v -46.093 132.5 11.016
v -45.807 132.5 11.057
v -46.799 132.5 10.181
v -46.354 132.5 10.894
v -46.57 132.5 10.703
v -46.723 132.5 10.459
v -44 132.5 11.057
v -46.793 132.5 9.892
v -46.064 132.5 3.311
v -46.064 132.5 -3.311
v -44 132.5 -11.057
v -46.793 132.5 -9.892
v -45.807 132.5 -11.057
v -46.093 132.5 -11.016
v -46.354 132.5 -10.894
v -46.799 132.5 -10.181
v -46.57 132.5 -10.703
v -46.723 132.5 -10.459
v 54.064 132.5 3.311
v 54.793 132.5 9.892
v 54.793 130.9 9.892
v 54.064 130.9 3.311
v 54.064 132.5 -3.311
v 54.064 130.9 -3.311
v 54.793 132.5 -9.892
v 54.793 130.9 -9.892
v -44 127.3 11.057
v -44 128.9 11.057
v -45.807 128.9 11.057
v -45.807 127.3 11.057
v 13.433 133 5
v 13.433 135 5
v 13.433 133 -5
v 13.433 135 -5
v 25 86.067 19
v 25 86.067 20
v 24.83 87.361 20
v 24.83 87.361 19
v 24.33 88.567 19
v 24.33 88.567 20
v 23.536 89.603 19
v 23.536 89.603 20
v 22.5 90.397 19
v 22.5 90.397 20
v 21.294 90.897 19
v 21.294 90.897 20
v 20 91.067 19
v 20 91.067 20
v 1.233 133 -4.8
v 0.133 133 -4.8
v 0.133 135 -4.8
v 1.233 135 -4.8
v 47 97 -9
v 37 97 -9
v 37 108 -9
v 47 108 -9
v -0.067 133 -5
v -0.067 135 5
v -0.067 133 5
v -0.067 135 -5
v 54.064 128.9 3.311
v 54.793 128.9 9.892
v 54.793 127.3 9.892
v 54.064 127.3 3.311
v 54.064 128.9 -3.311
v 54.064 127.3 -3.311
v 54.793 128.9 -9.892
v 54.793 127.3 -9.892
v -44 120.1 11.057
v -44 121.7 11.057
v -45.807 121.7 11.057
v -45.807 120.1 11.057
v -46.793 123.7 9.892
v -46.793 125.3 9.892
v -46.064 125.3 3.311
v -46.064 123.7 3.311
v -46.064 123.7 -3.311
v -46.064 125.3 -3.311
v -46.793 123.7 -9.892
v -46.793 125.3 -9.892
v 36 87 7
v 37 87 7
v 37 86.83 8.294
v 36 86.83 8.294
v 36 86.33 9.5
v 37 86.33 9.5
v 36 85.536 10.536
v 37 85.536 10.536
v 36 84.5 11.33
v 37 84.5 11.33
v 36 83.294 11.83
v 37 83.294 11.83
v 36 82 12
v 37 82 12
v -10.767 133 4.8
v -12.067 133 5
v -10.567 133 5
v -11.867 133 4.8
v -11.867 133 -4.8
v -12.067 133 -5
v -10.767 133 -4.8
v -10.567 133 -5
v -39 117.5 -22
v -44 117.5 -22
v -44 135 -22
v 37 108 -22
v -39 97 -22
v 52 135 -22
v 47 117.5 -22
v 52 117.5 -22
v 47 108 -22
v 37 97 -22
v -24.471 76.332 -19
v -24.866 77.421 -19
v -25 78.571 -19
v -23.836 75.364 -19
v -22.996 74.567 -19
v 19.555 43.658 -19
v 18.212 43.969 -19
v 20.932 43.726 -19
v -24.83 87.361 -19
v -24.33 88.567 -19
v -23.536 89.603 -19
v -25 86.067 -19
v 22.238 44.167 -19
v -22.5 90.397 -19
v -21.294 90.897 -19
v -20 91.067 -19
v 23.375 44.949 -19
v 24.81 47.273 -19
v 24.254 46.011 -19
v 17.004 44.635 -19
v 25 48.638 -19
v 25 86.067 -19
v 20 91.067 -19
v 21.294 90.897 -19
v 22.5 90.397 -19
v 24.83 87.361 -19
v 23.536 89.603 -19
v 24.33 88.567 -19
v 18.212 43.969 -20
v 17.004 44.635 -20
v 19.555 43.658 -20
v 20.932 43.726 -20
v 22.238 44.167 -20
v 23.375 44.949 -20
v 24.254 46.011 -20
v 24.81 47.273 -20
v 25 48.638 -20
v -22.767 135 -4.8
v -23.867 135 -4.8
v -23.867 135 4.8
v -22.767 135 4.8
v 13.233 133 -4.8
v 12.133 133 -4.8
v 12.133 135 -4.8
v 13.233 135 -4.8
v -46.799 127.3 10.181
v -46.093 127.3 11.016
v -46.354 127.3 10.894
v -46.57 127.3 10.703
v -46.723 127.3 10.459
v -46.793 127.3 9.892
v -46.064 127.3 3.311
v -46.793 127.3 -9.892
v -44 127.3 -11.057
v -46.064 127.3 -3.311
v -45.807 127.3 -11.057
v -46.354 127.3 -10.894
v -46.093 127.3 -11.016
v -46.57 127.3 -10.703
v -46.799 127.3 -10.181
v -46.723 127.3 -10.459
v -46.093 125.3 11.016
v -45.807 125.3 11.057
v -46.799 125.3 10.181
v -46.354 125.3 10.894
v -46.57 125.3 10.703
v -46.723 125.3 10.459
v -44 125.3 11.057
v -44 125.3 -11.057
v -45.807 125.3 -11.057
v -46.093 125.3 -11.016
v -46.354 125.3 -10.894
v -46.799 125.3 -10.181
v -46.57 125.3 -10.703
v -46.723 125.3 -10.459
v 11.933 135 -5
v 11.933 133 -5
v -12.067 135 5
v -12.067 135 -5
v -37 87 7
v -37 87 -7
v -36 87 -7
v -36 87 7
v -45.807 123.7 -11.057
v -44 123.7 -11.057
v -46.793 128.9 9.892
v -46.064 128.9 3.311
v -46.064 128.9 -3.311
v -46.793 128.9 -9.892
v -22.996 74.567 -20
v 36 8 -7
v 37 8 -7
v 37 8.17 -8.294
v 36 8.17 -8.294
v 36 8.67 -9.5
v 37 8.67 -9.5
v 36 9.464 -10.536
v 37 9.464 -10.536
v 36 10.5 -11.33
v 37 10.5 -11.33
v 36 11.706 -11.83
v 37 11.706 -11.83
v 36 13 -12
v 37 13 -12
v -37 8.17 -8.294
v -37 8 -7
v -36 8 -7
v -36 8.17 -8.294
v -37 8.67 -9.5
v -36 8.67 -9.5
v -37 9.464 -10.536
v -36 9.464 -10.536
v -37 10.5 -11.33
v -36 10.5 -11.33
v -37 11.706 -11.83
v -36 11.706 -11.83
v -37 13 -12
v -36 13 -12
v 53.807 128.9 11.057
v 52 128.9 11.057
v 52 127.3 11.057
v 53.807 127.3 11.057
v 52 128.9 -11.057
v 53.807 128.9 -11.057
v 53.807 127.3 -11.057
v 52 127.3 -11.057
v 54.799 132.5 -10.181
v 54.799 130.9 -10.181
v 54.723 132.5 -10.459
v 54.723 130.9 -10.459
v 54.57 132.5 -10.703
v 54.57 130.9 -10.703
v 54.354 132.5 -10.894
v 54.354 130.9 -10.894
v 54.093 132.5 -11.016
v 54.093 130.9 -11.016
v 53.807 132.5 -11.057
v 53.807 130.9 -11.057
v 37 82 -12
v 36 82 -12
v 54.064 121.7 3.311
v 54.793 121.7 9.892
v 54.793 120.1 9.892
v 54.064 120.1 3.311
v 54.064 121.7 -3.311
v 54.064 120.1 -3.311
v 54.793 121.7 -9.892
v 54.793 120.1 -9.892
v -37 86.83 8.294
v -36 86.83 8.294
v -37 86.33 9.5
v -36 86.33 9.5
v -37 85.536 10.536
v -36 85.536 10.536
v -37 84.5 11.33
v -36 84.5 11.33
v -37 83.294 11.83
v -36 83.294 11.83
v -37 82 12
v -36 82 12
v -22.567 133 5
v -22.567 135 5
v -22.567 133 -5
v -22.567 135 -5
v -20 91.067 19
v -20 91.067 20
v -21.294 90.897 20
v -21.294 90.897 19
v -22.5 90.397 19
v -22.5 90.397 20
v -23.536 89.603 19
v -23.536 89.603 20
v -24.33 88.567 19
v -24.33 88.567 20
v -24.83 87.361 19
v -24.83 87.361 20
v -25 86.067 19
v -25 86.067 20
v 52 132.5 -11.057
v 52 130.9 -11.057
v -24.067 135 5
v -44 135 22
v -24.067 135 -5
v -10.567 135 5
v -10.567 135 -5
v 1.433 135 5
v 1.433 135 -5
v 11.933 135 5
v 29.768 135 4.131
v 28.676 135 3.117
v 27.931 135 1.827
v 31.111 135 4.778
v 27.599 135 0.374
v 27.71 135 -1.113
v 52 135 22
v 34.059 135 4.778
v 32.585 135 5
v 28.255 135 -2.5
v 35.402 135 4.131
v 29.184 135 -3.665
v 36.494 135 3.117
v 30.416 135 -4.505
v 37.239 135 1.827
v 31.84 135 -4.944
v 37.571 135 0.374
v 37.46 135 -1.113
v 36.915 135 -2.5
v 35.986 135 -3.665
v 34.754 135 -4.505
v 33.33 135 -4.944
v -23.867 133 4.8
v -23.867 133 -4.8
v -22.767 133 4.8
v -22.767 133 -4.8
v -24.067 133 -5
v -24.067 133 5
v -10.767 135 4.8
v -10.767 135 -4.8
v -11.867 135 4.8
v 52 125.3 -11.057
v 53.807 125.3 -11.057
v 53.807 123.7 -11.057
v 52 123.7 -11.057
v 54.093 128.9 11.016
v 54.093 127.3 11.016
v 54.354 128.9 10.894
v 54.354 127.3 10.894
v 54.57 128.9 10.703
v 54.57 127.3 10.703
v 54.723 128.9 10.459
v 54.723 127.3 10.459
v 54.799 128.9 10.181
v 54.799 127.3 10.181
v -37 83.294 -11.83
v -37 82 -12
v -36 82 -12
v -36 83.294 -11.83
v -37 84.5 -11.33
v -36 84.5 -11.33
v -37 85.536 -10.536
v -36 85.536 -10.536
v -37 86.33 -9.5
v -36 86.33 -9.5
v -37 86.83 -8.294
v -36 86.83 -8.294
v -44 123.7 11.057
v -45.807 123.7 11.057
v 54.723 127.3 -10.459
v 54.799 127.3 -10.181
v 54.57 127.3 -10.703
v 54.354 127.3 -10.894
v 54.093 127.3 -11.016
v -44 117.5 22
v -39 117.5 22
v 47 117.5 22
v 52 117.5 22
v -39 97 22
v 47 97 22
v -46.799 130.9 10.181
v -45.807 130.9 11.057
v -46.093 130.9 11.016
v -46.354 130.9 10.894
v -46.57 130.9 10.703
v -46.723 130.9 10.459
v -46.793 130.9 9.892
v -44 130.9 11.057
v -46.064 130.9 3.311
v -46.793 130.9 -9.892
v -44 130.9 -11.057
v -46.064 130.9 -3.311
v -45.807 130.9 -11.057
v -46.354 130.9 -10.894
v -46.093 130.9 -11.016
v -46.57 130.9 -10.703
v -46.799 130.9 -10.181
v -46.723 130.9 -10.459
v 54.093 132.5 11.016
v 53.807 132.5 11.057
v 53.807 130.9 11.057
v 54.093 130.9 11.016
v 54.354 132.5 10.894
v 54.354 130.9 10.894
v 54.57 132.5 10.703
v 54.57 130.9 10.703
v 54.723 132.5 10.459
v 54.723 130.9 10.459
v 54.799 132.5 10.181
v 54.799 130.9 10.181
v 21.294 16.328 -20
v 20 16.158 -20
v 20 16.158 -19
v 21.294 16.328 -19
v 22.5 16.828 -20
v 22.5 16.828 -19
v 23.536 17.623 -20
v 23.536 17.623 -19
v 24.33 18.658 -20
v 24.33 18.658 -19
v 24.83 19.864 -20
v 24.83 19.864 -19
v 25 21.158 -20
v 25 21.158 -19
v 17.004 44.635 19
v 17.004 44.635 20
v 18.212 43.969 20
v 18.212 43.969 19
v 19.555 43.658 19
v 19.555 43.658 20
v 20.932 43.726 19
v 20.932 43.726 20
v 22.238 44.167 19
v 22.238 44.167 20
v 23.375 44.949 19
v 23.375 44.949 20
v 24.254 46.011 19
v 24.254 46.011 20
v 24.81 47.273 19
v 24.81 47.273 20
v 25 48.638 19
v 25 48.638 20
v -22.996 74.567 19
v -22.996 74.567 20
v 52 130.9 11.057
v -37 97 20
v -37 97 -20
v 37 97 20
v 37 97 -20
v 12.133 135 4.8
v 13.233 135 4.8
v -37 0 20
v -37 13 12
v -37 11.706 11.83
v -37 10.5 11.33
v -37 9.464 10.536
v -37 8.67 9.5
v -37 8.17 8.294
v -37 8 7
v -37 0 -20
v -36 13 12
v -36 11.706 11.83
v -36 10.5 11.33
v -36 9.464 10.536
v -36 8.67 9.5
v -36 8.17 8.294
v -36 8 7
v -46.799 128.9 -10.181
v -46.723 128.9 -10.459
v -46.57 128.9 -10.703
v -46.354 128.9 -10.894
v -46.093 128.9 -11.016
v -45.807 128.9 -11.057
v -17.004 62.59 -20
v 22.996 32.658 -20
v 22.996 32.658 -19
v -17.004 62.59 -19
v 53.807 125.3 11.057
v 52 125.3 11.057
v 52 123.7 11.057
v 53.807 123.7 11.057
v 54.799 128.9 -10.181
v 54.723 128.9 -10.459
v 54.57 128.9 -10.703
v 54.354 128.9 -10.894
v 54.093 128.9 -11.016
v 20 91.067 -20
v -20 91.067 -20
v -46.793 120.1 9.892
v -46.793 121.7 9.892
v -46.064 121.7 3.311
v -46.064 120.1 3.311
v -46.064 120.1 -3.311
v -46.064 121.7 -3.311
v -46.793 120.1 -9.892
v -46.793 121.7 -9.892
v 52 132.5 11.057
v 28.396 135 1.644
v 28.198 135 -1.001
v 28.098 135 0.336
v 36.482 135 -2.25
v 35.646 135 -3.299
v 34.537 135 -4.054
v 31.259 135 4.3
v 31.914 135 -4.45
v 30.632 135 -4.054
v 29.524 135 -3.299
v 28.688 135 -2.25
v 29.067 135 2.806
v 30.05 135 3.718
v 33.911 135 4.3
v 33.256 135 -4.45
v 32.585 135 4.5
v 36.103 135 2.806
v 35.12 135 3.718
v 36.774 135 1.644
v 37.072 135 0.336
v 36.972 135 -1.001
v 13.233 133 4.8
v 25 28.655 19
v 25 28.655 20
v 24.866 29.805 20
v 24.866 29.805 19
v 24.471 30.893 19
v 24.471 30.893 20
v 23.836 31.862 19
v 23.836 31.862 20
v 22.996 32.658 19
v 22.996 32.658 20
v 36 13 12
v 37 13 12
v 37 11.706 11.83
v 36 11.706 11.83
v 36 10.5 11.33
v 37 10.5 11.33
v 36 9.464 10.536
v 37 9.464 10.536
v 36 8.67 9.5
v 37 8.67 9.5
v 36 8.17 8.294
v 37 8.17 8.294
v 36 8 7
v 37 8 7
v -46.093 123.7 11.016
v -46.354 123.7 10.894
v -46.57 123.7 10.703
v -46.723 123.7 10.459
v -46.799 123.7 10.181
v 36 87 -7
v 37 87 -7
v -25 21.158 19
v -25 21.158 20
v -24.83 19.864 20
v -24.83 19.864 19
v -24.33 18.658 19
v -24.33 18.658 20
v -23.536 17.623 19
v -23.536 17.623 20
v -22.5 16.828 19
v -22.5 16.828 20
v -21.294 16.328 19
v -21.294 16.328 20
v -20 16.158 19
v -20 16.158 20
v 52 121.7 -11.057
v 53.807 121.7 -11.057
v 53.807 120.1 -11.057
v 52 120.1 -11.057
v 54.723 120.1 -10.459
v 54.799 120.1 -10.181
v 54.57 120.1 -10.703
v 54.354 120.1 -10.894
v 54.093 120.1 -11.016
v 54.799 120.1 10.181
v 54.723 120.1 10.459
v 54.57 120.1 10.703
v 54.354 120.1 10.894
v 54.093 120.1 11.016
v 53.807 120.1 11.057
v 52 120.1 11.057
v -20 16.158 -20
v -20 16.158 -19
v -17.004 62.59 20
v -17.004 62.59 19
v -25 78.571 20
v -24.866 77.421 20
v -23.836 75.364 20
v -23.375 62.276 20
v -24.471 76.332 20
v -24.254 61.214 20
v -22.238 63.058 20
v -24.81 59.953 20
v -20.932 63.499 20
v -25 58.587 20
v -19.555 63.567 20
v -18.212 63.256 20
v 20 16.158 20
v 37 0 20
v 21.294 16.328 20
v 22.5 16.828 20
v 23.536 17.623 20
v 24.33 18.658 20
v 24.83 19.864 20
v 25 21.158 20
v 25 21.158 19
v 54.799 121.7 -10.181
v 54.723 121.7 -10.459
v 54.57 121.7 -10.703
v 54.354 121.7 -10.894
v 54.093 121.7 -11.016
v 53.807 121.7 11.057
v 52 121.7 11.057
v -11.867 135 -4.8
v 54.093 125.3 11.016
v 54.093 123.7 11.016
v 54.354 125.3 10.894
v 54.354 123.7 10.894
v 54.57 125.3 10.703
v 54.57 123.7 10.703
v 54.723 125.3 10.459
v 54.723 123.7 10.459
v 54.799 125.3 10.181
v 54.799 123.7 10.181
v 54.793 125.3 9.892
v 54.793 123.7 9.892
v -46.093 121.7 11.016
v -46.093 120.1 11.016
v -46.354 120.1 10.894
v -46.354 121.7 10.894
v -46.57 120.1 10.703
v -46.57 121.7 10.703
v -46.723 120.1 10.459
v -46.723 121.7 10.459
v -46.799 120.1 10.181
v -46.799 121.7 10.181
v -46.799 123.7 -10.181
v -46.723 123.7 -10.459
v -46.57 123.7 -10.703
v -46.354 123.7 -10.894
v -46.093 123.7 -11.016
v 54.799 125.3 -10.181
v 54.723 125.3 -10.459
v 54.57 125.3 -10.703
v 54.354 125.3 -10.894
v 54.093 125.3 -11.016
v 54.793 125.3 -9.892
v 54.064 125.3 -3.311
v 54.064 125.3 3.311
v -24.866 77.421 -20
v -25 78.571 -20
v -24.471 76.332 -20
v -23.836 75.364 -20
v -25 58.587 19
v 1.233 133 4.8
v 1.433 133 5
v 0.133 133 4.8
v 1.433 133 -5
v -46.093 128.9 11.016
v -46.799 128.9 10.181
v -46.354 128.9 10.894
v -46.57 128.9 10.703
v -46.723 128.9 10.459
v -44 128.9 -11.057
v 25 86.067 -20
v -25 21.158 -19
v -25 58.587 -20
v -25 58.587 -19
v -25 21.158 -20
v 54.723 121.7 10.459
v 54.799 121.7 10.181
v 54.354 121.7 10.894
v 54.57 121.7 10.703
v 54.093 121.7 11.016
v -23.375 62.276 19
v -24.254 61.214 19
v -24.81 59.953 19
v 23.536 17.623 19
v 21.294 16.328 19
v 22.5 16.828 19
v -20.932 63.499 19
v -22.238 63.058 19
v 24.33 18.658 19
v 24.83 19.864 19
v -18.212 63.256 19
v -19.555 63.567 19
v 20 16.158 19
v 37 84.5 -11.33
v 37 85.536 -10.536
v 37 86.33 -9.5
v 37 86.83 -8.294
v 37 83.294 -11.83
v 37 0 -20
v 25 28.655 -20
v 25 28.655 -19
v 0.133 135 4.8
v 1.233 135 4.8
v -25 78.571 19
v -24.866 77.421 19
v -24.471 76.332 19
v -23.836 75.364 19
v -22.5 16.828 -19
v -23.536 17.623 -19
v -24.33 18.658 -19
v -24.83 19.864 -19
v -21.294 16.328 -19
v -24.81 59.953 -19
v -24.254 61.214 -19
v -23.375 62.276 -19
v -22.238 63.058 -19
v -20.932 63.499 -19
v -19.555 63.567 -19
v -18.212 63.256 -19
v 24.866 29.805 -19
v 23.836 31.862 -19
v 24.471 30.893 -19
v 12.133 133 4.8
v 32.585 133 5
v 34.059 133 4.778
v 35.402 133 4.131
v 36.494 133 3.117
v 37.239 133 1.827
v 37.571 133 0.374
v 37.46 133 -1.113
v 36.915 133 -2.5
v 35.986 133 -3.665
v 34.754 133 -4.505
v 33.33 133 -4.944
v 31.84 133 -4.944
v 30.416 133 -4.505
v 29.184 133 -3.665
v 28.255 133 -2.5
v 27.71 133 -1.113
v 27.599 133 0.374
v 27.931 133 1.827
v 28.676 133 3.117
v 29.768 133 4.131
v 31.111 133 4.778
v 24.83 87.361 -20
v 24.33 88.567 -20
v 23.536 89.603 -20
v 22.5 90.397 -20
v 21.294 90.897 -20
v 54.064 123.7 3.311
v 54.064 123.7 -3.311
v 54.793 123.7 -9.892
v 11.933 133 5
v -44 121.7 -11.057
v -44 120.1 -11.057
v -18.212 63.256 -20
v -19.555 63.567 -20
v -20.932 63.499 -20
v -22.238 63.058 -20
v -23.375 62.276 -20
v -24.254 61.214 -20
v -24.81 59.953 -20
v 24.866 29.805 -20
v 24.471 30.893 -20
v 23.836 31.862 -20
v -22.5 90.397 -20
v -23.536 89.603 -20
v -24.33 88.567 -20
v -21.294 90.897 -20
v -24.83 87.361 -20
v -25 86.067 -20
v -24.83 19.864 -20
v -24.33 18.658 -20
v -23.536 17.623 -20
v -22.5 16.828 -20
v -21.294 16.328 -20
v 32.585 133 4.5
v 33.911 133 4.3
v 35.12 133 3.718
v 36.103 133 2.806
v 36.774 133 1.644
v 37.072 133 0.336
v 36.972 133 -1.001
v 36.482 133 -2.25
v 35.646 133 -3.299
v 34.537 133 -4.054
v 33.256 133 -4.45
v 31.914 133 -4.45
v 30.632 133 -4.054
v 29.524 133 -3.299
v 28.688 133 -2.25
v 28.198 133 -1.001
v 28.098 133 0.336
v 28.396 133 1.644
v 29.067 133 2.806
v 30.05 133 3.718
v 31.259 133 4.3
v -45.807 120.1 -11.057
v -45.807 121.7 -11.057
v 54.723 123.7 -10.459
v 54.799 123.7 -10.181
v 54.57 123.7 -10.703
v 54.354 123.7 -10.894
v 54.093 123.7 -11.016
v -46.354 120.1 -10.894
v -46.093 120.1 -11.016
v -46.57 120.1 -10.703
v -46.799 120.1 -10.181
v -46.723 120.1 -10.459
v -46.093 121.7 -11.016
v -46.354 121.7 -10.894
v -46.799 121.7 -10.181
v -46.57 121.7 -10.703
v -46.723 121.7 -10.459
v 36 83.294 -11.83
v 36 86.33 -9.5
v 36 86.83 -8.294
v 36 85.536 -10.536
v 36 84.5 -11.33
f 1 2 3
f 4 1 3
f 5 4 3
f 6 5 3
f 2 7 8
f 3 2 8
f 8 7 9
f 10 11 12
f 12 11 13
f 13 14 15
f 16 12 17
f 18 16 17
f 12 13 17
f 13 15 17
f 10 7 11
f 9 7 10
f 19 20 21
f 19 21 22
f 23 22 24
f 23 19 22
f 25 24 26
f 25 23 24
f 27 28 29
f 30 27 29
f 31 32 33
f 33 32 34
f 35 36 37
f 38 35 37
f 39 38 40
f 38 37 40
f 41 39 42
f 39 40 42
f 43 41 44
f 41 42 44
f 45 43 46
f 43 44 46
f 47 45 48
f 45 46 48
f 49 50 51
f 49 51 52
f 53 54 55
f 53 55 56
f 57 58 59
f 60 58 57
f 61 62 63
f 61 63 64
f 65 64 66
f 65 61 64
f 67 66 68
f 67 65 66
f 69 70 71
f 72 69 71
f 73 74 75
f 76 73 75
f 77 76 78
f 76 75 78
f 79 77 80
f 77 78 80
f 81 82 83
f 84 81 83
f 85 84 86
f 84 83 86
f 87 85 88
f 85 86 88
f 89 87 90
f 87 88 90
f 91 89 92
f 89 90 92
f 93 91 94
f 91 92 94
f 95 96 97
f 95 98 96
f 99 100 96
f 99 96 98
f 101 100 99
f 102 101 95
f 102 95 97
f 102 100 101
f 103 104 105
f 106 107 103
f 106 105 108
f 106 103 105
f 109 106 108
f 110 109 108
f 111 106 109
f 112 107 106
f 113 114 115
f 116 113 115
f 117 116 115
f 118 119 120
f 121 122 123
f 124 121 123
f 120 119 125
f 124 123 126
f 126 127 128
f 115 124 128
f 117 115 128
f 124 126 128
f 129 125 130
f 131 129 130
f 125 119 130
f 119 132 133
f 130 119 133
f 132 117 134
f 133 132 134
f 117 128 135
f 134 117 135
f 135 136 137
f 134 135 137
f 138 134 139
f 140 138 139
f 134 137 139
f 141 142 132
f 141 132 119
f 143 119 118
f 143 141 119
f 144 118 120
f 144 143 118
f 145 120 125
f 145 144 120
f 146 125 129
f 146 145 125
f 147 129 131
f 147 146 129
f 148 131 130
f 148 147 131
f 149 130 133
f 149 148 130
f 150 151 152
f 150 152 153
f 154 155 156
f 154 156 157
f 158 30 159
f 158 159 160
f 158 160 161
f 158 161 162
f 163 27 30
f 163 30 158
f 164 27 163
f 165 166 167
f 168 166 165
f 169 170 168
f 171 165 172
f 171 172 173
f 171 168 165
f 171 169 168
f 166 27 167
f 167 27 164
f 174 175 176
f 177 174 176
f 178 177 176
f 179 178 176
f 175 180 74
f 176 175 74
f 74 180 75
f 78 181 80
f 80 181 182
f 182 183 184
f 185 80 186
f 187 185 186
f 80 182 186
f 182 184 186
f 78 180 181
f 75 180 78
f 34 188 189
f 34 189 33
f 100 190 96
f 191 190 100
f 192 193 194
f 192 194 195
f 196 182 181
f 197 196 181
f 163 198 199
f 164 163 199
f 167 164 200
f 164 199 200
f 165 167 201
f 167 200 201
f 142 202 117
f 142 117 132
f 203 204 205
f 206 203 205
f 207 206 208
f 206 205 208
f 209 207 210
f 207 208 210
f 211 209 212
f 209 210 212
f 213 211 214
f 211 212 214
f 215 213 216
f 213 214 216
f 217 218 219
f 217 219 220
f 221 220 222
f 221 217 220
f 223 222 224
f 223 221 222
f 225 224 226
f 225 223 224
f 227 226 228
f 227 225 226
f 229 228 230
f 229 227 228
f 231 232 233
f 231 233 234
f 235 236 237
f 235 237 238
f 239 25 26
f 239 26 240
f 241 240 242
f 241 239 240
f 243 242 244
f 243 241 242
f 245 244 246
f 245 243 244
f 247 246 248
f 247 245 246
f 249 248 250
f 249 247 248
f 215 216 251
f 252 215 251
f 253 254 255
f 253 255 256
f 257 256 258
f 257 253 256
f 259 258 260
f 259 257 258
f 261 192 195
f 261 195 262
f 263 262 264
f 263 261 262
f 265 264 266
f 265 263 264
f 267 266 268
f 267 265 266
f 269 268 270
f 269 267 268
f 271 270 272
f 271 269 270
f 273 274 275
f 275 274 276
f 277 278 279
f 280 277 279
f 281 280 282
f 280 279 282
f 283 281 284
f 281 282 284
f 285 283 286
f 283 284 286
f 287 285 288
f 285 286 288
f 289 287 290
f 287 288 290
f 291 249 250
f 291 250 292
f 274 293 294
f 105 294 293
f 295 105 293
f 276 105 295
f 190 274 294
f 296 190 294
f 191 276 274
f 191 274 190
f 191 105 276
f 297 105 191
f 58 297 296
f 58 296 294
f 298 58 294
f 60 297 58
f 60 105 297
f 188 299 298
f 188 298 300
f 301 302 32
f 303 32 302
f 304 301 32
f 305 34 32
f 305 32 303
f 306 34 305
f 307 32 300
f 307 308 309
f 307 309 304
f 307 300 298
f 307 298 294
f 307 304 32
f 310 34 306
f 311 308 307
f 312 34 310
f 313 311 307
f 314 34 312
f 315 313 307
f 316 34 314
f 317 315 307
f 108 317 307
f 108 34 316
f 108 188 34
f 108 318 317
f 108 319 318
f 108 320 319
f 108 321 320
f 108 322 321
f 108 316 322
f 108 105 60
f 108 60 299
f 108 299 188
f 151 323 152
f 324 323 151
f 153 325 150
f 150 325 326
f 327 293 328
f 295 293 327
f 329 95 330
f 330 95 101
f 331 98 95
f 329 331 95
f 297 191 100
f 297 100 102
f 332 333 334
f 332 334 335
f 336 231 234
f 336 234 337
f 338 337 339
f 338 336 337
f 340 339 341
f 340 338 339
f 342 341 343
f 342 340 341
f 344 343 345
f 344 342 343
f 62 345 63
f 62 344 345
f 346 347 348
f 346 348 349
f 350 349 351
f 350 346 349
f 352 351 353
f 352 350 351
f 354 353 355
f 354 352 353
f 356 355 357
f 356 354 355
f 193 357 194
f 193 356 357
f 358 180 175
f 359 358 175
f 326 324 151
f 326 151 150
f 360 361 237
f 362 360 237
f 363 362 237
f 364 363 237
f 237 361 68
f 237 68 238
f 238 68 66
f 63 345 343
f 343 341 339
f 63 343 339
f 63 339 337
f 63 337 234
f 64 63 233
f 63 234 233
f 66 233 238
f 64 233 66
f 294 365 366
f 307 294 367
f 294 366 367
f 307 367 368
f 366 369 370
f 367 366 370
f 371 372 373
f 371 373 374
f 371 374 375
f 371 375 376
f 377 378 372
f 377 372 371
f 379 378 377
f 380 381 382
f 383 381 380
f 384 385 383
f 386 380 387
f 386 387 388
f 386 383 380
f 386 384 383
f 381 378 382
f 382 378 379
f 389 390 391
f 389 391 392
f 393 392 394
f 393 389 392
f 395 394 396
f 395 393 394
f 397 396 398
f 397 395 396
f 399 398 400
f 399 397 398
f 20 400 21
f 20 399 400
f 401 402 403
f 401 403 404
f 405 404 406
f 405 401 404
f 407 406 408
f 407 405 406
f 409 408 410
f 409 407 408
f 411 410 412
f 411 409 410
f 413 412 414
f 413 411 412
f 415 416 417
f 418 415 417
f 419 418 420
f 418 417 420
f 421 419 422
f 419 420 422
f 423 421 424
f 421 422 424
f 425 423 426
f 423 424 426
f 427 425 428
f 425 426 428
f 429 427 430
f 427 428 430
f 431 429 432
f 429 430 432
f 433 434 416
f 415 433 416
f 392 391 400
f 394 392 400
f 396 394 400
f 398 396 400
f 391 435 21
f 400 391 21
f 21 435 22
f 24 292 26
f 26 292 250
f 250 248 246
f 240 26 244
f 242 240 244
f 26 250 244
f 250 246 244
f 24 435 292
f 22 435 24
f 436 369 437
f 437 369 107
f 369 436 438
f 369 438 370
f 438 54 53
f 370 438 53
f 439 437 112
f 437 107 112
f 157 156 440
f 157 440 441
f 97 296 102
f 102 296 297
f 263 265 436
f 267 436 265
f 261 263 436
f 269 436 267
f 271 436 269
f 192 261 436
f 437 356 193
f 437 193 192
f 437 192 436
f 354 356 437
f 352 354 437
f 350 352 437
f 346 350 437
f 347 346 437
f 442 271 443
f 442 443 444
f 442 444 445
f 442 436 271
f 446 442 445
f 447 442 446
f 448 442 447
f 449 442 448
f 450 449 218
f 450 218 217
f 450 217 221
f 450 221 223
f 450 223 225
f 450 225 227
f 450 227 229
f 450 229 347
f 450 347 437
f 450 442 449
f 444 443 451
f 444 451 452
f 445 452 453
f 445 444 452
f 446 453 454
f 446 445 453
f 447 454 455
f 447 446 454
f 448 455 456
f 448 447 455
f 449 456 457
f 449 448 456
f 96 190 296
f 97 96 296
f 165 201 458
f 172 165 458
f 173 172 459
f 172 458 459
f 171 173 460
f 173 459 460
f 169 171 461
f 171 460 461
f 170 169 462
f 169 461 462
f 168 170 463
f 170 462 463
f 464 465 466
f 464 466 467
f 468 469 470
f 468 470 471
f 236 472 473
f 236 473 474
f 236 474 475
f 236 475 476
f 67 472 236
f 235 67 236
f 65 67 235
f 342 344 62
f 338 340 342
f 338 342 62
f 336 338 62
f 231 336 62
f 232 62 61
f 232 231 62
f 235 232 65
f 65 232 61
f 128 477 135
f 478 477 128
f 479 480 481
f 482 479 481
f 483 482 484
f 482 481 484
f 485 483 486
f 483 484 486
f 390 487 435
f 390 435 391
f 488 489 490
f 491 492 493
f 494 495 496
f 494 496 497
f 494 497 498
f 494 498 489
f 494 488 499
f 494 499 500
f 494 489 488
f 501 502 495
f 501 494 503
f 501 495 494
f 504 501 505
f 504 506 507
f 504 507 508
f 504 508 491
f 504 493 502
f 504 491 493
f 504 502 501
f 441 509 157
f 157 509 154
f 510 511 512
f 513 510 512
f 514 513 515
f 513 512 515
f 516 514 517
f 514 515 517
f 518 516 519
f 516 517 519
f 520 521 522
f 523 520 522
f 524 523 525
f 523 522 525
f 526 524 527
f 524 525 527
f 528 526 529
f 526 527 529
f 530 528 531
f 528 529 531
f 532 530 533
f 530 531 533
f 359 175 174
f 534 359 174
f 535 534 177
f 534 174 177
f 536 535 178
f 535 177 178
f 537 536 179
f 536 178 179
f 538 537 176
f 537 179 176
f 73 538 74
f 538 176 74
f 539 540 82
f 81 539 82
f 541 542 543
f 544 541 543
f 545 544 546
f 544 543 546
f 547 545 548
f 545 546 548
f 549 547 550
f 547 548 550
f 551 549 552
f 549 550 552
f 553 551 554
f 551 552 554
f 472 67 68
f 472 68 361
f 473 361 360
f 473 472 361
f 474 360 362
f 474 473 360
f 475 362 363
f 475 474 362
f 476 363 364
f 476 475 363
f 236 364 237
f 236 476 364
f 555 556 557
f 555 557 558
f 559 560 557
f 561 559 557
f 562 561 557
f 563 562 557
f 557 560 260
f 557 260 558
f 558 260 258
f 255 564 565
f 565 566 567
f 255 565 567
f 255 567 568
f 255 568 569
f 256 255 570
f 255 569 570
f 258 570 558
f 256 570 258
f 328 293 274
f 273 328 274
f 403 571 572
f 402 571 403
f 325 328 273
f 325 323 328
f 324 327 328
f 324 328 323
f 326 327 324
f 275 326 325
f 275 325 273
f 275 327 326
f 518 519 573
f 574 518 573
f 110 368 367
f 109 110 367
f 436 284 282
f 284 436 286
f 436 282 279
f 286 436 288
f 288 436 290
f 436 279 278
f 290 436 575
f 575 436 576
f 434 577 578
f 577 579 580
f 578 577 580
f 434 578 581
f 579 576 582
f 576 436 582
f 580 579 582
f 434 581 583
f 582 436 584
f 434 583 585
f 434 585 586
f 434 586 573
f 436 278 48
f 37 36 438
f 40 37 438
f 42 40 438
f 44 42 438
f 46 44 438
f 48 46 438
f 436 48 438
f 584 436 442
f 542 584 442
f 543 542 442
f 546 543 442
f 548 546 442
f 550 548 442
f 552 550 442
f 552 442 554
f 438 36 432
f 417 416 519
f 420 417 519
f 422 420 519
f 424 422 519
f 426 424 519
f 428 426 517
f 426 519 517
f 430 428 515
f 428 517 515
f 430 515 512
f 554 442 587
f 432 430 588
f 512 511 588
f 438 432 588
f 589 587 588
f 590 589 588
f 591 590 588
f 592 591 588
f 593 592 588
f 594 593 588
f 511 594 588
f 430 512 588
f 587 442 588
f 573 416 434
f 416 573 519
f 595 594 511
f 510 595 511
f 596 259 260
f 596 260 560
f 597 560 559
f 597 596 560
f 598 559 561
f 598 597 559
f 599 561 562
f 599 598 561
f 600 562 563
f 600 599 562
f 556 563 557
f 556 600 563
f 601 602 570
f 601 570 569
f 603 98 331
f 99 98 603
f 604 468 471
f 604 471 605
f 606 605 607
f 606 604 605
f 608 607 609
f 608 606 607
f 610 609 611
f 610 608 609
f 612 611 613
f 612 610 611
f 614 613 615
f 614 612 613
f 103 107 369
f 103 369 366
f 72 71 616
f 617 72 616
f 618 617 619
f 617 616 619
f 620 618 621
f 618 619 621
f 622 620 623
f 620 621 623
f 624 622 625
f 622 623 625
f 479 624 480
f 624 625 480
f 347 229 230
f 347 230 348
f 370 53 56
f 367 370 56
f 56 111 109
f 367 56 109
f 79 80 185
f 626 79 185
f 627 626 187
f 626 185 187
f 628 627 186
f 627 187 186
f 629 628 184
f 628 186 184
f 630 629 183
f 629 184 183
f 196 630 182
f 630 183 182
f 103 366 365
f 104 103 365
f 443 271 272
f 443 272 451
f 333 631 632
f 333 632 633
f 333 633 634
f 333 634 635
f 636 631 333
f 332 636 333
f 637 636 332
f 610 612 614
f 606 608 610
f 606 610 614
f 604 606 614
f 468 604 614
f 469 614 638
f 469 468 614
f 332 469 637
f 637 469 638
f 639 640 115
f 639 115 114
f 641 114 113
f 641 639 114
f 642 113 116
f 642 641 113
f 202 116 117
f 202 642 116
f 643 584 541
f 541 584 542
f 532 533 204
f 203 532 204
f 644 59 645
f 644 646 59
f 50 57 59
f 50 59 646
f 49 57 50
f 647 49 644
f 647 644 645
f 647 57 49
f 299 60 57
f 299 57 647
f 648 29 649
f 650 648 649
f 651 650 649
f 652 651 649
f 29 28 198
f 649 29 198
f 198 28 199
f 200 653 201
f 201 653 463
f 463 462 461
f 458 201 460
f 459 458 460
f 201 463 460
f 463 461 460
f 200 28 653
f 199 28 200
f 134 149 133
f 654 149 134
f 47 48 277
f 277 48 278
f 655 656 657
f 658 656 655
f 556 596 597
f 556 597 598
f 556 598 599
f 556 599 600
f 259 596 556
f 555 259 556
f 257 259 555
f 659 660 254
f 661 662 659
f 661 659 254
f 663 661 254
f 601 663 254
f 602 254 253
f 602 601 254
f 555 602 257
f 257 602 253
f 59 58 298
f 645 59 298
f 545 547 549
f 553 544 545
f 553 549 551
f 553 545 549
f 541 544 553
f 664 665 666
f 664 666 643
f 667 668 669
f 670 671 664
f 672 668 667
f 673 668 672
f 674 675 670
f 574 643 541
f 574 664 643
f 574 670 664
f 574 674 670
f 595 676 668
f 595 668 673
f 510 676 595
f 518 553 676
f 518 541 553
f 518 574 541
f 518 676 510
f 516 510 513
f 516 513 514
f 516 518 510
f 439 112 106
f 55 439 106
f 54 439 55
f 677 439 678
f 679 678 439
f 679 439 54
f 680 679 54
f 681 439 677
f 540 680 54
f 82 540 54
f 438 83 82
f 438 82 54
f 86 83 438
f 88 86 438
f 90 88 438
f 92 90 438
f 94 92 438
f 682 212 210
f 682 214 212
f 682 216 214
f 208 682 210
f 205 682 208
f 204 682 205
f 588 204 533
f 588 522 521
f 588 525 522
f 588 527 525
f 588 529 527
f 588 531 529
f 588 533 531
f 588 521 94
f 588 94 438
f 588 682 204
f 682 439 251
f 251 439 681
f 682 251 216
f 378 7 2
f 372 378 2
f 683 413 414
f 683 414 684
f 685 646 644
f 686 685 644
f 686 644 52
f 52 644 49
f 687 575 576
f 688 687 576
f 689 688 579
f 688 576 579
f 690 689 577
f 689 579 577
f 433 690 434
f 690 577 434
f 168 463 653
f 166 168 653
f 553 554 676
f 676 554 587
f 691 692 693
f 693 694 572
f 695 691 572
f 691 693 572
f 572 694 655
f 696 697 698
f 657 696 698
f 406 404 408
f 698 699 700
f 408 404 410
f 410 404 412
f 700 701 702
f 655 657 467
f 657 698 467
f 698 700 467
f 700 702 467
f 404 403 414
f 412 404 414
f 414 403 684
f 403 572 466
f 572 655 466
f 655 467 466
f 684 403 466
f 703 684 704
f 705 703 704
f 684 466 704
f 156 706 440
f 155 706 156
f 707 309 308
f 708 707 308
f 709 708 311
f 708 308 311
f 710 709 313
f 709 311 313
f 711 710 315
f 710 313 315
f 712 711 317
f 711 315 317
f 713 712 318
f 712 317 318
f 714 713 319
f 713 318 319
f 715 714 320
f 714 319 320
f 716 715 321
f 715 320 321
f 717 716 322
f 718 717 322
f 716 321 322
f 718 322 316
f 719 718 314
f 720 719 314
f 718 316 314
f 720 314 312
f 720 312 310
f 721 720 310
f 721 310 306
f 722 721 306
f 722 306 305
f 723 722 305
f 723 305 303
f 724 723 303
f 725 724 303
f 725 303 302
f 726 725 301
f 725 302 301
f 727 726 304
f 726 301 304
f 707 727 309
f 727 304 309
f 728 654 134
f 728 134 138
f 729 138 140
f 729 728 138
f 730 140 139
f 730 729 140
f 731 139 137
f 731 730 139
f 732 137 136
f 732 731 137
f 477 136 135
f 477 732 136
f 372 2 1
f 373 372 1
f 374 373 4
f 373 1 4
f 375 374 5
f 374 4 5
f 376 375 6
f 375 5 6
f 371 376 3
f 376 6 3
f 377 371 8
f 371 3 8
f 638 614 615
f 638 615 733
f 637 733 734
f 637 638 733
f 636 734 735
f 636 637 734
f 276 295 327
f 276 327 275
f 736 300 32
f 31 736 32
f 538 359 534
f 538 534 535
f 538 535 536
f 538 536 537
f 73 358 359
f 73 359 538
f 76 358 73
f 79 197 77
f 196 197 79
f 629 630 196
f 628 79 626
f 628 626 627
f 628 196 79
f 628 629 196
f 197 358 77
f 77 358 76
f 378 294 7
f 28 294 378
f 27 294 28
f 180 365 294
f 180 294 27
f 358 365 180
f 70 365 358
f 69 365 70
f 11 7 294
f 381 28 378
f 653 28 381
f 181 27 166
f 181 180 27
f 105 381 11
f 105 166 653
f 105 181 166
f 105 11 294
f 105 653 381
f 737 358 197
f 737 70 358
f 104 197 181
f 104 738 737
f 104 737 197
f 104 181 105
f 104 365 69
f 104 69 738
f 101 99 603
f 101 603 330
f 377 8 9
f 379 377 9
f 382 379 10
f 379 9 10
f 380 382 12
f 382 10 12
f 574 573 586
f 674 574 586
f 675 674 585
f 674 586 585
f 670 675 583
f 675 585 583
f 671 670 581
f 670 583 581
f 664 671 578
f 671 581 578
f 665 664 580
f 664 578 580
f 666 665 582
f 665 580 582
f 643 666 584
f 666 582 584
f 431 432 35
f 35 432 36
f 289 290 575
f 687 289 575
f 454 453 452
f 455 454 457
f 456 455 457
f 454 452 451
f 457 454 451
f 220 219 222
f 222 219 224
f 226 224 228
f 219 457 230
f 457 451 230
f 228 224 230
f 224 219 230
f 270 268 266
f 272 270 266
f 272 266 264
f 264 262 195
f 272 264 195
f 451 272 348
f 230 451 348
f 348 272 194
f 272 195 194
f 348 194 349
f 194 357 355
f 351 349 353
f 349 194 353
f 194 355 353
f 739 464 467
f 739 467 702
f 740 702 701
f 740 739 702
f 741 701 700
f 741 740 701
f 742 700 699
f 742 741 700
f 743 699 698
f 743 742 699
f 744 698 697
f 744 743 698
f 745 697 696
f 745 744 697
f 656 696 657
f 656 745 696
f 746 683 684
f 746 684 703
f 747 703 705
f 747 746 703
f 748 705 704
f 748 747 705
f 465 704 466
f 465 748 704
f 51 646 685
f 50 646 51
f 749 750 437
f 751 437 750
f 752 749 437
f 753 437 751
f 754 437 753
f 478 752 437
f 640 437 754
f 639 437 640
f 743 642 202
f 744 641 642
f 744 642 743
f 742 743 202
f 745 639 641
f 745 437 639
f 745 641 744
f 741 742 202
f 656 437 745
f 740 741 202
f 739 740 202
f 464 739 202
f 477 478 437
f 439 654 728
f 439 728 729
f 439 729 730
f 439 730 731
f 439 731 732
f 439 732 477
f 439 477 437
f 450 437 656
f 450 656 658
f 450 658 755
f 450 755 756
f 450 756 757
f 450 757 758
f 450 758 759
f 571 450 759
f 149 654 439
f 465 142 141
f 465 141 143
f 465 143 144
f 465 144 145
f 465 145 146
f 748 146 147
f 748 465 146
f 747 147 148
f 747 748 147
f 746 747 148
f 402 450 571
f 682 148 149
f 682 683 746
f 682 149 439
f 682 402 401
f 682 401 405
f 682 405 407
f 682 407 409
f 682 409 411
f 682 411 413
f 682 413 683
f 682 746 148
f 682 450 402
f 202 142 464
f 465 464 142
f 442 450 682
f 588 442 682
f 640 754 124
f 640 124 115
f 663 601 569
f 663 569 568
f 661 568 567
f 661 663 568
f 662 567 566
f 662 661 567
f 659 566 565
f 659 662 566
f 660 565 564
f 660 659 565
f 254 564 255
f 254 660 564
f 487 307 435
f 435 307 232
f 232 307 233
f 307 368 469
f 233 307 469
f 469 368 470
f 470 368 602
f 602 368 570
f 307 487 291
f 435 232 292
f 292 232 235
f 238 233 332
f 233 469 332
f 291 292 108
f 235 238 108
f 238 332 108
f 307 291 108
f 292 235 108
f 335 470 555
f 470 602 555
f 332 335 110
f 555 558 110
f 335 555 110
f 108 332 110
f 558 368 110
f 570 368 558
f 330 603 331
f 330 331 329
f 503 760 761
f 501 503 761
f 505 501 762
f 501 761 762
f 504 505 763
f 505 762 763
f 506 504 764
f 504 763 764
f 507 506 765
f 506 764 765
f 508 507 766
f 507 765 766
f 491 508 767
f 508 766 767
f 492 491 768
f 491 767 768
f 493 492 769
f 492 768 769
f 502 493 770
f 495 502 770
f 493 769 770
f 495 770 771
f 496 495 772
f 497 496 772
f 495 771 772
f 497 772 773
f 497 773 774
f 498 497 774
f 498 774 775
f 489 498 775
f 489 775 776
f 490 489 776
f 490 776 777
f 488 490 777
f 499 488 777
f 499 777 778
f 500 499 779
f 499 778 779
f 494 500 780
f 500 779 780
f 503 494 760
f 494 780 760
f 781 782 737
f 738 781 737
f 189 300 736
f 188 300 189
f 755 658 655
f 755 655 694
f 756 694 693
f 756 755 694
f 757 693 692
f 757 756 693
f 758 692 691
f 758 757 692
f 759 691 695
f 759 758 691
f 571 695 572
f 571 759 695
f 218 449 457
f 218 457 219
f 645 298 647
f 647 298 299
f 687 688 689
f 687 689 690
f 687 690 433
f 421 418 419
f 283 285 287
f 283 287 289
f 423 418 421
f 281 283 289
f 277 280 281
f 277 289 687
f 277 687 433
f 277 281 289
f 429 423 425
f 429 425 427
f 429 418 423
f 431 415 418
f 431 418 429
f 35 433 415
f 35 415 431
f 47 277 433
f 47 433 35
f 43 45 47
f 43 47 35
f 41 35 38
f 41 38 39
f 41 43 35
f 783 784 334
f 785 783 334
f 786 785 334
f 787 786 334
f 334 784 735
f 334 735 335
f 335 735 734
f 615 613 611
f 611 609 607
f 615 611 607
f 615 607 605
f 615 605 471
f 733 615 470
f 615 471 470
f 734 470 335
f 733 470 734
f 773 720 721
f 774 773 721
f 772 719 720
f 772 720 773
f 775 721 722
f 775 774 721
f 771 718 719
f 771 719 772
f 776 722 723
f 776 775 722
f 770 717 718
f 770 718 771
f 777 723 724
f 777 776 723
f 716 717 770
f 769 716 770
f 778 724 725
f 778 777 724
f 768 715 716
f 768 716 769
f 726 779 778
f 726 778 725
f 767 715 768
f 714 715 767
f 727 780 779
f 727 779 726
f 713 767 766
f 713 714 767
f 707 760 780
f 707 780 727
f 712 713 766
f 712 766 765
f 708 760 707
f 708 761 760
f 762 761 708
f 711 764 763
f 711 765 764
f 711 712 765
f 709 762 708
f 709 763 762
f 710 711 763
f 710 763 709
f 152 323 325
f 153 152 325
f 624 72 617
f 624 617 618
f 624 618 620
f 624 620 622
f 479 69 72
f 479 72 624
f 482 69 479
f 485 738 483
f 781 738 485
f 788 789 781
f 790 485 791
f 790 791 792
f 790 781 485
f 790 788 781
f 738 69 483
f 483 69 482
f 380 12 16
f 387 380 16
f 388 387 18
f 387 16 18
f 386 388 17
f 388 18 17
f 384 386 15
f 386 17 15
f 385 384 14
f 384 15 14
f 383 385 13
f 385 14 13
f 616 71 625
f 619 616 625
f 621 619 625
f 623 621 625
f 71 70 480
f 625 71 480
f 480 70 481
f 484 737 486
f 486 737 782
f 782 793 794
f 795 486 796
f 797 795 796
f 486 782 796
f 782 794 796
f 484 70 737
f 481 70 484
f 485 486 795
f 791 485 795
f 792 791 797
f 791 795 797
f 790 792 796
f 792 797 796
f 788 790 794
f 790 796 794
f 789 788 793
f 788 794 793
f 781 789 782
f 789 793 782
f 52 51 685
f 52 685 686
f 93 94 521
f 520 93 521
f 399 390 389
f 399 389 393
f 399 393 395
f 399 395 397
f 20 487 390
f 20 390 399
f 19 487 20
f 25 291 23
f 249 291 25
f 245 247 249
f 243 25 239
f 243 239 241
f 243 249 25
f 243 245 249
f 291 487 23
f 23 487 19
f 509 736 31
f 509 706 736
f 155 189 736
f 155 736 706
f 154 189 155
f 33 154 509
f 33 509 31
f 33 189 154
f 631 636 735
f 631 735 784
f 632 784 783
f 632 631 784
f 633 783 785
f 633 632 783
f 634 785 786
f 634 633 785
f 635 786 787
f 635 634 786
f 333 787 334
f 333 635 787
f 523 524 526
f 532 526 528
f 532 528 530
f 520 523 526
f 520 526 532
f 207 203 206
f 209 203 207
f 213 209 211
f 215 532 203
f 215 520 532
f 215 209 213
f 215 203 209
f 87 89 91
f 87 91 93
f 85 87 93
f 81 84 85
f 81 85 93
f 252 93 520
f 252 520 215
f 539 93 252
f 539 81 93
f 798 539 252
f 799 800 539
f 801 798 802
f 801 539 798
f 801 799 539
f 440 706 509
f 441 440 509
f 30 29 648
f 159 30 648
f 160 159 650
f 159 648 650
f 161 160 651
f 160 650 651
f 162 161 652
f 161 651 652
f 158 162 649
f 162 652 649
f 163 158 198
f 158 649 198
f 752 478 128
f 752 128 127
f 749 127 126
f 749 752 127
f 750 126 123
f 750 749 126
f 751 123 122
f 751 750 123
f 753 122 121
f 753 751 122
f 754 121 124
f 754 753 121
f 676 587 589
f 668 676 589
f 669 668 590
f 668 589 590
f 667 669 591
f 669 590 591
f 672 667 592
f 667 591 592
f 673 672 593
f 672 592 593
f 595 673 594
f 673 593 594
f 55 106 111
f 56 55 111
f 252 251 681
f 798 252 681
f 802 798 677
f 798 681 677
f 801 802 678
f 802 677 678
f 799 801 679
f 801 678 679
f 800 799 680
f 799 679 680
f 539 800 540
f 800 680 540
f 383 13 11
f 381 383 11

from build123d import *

# Parameters (mm, degrees)
SKETCH_1_W             = 74
SKETCH_1_H             = 40
EXTRUDE_1_DEPTH        = 97
SKETCH_2_W             = 96
SKETCH_2_H             = 44
EXTRUDE_2_DEPTH        = 38
SKETCH_3_W             = 10
SKETCH_3_H             = 13
CUT_EXTRUDE_1_DEPTH    = 11
SKETCH_4_W             = 5
SKETCH_4_H             = 44
CUT_EXTRUDE_2_DEPTH    = 11
SKETCH_5_R             = 5
SKETCH_5_W             = 1.5
SKETCH_5_H             = 10
CUT_EXTRUDE_3_DEPTH    = 2
SKETCH_6_R             = 4.5
SKETCH_6_W             = 1.1
SKETCH_6_H             = 9.6
EXTRUDE_3_DEPTH        = 2
EXTRUDE_4_DEPTH        = 1.6
PATTERN_LINEAR_1_COUNT = 4
PATTERN_LINEAR_1_PITCH = 3.6
MIRROR_2_COPY_1_DEPTH  = 1.6
MIRROR_2_COPY_2_DEPTH  = 1.6
MIRROR_2_COPY_3_DEPTH  = 1.6
CUT_EXTRUDE_4_DEPTH    = 1
CUT_EXTRUDE_5_DEPTH    = 1
SKETCH_10_W            = 5
SKETCH_10_H            = 20.5
SKETCH_10_H_2          = 9.5
CUT_EXTRUDE_6_DEPTH    = 153.199942279


with BuildPart() as part:
    # 草图1 → 凸台-拉伸1 (new body)
    with BuildSketch(Plane(origin=(0, 0, 0), x_dir=(1, 0, 0), z_dir=(0, 1, 0))):
        Rectangle(SKETCH_1_W, SKETCH_1_H)
    extrude(amount=EXTRUDE_1_DEPTH)

    # 草图2 → 凸台-拉伸2 (add)
    with BuildSketch(Plane(origin=(0, 97, 0), x_dir=(1, 0, 0), z_dir=(0, 1, 0))):
        with Locations((4, 0)):
            Rectangle(SKETCH_2_W, SKETCH_2_H)
    extrude(amount=EXTRUDE_2_DEPTH)

    # 草图3 → 切除-拉伸1 (cut)
    with BuildSketch(Plane.XZ.offset(-97)):
        with Locations((42, -15.5)):
            Rectangle(SKETCH_3_W, SKETCH_3_H)
    extrude(amount=-CUT_EXTRUDE_1_DEPTH, mode=Mode.SUBTRACT)

    # 草图4 → 切除-拉伸2 (cut)
    with BuildSketch(Plane.XZ.offset(-97)):
        with Locations((49.5, 0)):
            Rectangle(SKETCH_4_W, SKETCH_4_H)
    extrude(amount=-CUT_EXTRUDE_2_DEPTH, mode=Mode.SUBTRACT)

    # 草图5 → 切除-拉伸3 (cut)
    with BuildSketch(Plane(origin=(0, 135, 0), x_dir=(1, 0, 0), z_dir=(0, 1, 0))):
        with Locations(Location((32.584956569, 0, 0), (0, 0, 270))):
            Circle(SKETCH_5_R)
        with Locations((12.683099686, 0)):
            Rectangle(SKETCH_5_W, SKETCH_5_H)
        with Locations((0.683099686, 0)):
            Rectangle(SKETCH_5_W, SKETCH_5_H)
        with Locations((-11.316900314, 0)):
            Rectangle(SKETCH_5_W, SKETCH_5_H)
        with Locations((-23.316900314, 0)):
            Rectangle(SKETCH_5_W, SKETCH_5_H)
    extrude(amount=-CUT_EXTRUDE_3_DEPTH, mode=Mode.SUBTRACT)

    # 草图6 → 凸台-拉伸3 (add)
    with BuildSketch(Plane(origin=(0, 133, 0), x_dir=(1, 0, 0), z_dir=(0, 1, 0))):
        with Locations(Location((32.584956569, 0, 0), (0, 0, 270))):
            Circle(SKETCH_6_R)
        with Locations((-23.316900314, 0)):
            Rectangle(SKETCH_6_W, SKETCH_6_H)
        with Locations((-11.316900314, 0)):
            Rectangle(SKETCH_6_W, SKETCH_6_H)
        with Locations((0.683099686, 0)):
            Rectangle(SKETCH_6_W, SKETCH_6_H)
        with Locations((12.683099686, 0)):
            Rectangle(SKETCH_6_W, SKETCH_6_H)
    extrude(amount=EXTRUDE_3_DEPTH)

    # 草图7 → 凸台-拉伸4 (add)
    with BuildSketch(Plane(origin=(0, 132.5, 0), x_dir=(1, 0, 0), z_dir=(0, 1, 0))):
        with BuildLine():
            Line((-44, -11.057288531), (-45.807138492, -11.057288531))
            ThreePointArc((-45.807138492, -11.057288531), (-46.570313957, -10.703479841), (-46.793453199, -9.892414949))
            ThreePointArc((-46.793453199, -9.892414949), (-45.972335636, 0), (-46.793453199, 9.892414949))
            ThreePointArc((-46.793453199, 9.892414949), (-46.570313957, 10.703479841), (-45.807138492, 11.057288531))
            Line((-45.807138492, 11.057288531), (-44, 11.057288531))
            Line((-44, 11.057288531), (-44, -11.057288531))
        make_face()
    extrude_4 = extrude(amount=-EXTRUDE_4_DEPTH)

    # 阵列(线性)1: 凸台-拉伸4 ×4
    with Locations(*[(0, -i * PATTERN_LINEAR_1_PITCH, 0) for i in range(1, PATTERN_LINEAR_1_COUNT)]):
        add(extrude_4)

    # 镜向2: 凸台-拉伸4 across plane
    add(extrude_4.mirror(Plane.ZY.offset(-4)))

    # 镜向2 copy 1 sketch → 镜向2 copy 1 (add)
    with BuildSketch(Plane(origin=(8, 128.9, 0), x_dir=(-1, 0, 0), z_dir=(0, 1, 0))):
        with BuildLine():
            Line((-44, 11.057288531), (-45.807138492, 11.057288531))
            ThreePointArc((-45.807138492, 11.057288531), (-46.570313957, 10.703479841), (-46.793453199, 9.892414949))
            ThreePointArc((-46.793453199, 9.892414949), (-45.972335636, 0), (-46.793453199, -9.892414949))
            ThreePointArc((-46.793453199, -9.892414949), (-46.570313957, -10.703479841), (-45.807138492, -11.057288531))
            Line((-45.807138492, -11.057288531), (-44, -11.057288531))
            Line((-44, -11.057288531), (-44, 11.057288531))
        make_face()
    extrude(amount=-MIRROR_2_COPY_1_DEPTH)

    # 镜向2 copy 2 sketch → 镜向2 copy 2 (add)
    with BuildSketch(Plane(origin=(8, 125.3, 0), x_dir=(-1, 0, 0), z_dir=(0, 1, 0))):
        with BuildLine():
            Line((-44, 11.057288531), (-45.807138492, 11.057288531))
            ThreePointArc((-45.807138492, 11.057288531), (-46.570313957, 10.703479841), (-46.793453199, 9.892414949))
            ThreePointArc((-46.793453199, 9.892414949), (-45.972335636, 0), (-46.793453199, -9.892414949))
            ThreePointArc((-46.793453199, -9.892414949), (-46.570313957, -10.703479841), (-45.807138492, -11.057288531))
            Line((-45.807138492, -11.057288531), (-44, -11.057288531))
            Line((-44, -11.057288531), (-44, 11.057288531))
        make_face()
    extrude(amount=-MIRROR_2_COPY_2_DEPTH)

    # 镜向2 copy 3 sketch → 镜向2 copy 3 (add)
    with BuildSketch(Plane(origin=(8, 121.7, 0), x_dir=(-1, 0, 0), z_dir=(0, 1, 0))):
        with BuildLine():
            Line((-44, 11.057288531), (-45.807138492, 11.057288531))
            ThreePointArc((-45.807138492, 11.057288531), (-46.570313957, 10.703479841), (-46.793453199, 9.892414949))
            ThreePointArc((-46.793453199, 9.892414949), (-45.972335636, 0), (-46.793453199, -9.892414949))
            ThreePointArc((-46.793453199, -9.892414949), (-46.570313957, -10.703479841), (-45.807138492, -11.057288531))
            Line((-45.807138492, -11.057288531), (-44, -11.057288531))
            Line((-44, -11.057288531), (-44, 11.057288531))
        make_face()
    extrude(amount=-MIRROR_2_COPY_3_DEPTH)

    # 草图8 → 切除-拉伸4 (cut)
    with BuildSketch(Plane.ZY.offset(37)):
        with BuildLine():
            Line((-7, 87), (7, 87))
            ThreePointArc((7, 87), (10.535533906, 85.535533906), (12, 82))
            Line((12, 82), (12, 13))
            ThreePointArc((12, 13), (10.535533906, 9.464466094), (7, 8))
            Line((7, 8), (-7, 8))
            ThreePointArc((-7, 8), (-10.535533906, 9.464466094), (-12, 13))
            Line((-12, 13), (-12, 82))
            ThreePointArc((-12, 82), (-10.535533906, 85.535533906), (-7, 87))
        make_face()
    cut_extrude_4 = extrude(amount=-CUT_EXTRUDE_4_DEPTH, mode=Mode.SUBTRACT)

    # 镜向3: 切除-拉伸4 across plane
    add(cut_extrude_4.mirror(Plane(origin=(0, 0, 0), x_dir=(0, 0, 1), z_dir=(1, 0, 0))), mode=Mode.SUBTRACT)

    # 草图9 → 切除-拉伸5 (cut)
    with BuildSketch(Plane(origin=(0, 0, -20), x_dir=(-1, 0, 0), z_dir=(0, 0, -1))):
        with BuildLine():
            Line((-20, 91.06721858), (20, 91.06721858))
            ThreePointArc((20, 91.06721858), (23.535533906, 89.602752486), (25, 86.06721858))
            Line((25, 86.06721858), (25, 78.57061248))
            ThreePointArc((25, 78.57061248), (24.470921387, 76.332117014), (22.995655219, 74.567357579))
            Line((22.995655219, 74.567357579), (-17.004344781, 44.635161975))
            ThreePointArc((-17.004344781, 44.635161975), (-22.238495466, 44.167495489), (-25, 48.638416876))
            Line((-25, 48.638416876), (-25, 86.06721858))
            ThreePointArc((-25, 86.06721858), (-23.535533906, 89.602752486), (-20, 91.06721858))
        make_face()
        with BuildLine():
            Line((-22.995655219, 32.657933054), (17.004344781, 62.590128658))
            ThreePointArc((17.004344781, 62.590128658), (22.238495466, 63.057795143), (25, 58.586873756))
            Line((25, 58.586873756), (25, 21.158072053))
            ThreePointArc((25, 21.158072053), (23.535533906, 17.622538147), (20, 16.158072053))
            Line((20, 16.158072053), (-20, 16.158072053))
            ThreePointArc((-20, 16.158072053), (-23.535533906, 17.622538147), (-25, 21.158072053))
            Line((-25, 21.158072053), (-25, 28.654678152))
            ThreePointArc((-25, 28.654678152), (-24.470921387, 30.893173618), (-22.995655219, 32.657933054))
        make_face()
    cut_extrude_5 = extrude(amount=-CUT_EXTRUDE_5_DEPTH, mode=Mode.SUBTRACT)

    # 镜向4: 切除-拉伸5 across plane
    add(cut_extrude_5.mirror(Plane.XY), mode=Mode.SUBTRACT)

    # 草图10 → 切除-拉伸6 (cut, through all)
    with BuildSketch(Plane(origin=(0, 0, -22), x_dir=(-1, 0, 0), z_dir=(0, 0, -1))):
        with Locations((41.5, 107.25)):
            Rectangle(SKETCH_10_W, SKETCH_10_H)
        with Locations((-49.5, 112.75)):
            Rectangle(SKETCH_10_W, SKETCH_10_H_2)
    extrude(amount=-CUT_EXTRUDE_6_DEPTH, mode=Mode.SUBTRACT)


solid = part.part
